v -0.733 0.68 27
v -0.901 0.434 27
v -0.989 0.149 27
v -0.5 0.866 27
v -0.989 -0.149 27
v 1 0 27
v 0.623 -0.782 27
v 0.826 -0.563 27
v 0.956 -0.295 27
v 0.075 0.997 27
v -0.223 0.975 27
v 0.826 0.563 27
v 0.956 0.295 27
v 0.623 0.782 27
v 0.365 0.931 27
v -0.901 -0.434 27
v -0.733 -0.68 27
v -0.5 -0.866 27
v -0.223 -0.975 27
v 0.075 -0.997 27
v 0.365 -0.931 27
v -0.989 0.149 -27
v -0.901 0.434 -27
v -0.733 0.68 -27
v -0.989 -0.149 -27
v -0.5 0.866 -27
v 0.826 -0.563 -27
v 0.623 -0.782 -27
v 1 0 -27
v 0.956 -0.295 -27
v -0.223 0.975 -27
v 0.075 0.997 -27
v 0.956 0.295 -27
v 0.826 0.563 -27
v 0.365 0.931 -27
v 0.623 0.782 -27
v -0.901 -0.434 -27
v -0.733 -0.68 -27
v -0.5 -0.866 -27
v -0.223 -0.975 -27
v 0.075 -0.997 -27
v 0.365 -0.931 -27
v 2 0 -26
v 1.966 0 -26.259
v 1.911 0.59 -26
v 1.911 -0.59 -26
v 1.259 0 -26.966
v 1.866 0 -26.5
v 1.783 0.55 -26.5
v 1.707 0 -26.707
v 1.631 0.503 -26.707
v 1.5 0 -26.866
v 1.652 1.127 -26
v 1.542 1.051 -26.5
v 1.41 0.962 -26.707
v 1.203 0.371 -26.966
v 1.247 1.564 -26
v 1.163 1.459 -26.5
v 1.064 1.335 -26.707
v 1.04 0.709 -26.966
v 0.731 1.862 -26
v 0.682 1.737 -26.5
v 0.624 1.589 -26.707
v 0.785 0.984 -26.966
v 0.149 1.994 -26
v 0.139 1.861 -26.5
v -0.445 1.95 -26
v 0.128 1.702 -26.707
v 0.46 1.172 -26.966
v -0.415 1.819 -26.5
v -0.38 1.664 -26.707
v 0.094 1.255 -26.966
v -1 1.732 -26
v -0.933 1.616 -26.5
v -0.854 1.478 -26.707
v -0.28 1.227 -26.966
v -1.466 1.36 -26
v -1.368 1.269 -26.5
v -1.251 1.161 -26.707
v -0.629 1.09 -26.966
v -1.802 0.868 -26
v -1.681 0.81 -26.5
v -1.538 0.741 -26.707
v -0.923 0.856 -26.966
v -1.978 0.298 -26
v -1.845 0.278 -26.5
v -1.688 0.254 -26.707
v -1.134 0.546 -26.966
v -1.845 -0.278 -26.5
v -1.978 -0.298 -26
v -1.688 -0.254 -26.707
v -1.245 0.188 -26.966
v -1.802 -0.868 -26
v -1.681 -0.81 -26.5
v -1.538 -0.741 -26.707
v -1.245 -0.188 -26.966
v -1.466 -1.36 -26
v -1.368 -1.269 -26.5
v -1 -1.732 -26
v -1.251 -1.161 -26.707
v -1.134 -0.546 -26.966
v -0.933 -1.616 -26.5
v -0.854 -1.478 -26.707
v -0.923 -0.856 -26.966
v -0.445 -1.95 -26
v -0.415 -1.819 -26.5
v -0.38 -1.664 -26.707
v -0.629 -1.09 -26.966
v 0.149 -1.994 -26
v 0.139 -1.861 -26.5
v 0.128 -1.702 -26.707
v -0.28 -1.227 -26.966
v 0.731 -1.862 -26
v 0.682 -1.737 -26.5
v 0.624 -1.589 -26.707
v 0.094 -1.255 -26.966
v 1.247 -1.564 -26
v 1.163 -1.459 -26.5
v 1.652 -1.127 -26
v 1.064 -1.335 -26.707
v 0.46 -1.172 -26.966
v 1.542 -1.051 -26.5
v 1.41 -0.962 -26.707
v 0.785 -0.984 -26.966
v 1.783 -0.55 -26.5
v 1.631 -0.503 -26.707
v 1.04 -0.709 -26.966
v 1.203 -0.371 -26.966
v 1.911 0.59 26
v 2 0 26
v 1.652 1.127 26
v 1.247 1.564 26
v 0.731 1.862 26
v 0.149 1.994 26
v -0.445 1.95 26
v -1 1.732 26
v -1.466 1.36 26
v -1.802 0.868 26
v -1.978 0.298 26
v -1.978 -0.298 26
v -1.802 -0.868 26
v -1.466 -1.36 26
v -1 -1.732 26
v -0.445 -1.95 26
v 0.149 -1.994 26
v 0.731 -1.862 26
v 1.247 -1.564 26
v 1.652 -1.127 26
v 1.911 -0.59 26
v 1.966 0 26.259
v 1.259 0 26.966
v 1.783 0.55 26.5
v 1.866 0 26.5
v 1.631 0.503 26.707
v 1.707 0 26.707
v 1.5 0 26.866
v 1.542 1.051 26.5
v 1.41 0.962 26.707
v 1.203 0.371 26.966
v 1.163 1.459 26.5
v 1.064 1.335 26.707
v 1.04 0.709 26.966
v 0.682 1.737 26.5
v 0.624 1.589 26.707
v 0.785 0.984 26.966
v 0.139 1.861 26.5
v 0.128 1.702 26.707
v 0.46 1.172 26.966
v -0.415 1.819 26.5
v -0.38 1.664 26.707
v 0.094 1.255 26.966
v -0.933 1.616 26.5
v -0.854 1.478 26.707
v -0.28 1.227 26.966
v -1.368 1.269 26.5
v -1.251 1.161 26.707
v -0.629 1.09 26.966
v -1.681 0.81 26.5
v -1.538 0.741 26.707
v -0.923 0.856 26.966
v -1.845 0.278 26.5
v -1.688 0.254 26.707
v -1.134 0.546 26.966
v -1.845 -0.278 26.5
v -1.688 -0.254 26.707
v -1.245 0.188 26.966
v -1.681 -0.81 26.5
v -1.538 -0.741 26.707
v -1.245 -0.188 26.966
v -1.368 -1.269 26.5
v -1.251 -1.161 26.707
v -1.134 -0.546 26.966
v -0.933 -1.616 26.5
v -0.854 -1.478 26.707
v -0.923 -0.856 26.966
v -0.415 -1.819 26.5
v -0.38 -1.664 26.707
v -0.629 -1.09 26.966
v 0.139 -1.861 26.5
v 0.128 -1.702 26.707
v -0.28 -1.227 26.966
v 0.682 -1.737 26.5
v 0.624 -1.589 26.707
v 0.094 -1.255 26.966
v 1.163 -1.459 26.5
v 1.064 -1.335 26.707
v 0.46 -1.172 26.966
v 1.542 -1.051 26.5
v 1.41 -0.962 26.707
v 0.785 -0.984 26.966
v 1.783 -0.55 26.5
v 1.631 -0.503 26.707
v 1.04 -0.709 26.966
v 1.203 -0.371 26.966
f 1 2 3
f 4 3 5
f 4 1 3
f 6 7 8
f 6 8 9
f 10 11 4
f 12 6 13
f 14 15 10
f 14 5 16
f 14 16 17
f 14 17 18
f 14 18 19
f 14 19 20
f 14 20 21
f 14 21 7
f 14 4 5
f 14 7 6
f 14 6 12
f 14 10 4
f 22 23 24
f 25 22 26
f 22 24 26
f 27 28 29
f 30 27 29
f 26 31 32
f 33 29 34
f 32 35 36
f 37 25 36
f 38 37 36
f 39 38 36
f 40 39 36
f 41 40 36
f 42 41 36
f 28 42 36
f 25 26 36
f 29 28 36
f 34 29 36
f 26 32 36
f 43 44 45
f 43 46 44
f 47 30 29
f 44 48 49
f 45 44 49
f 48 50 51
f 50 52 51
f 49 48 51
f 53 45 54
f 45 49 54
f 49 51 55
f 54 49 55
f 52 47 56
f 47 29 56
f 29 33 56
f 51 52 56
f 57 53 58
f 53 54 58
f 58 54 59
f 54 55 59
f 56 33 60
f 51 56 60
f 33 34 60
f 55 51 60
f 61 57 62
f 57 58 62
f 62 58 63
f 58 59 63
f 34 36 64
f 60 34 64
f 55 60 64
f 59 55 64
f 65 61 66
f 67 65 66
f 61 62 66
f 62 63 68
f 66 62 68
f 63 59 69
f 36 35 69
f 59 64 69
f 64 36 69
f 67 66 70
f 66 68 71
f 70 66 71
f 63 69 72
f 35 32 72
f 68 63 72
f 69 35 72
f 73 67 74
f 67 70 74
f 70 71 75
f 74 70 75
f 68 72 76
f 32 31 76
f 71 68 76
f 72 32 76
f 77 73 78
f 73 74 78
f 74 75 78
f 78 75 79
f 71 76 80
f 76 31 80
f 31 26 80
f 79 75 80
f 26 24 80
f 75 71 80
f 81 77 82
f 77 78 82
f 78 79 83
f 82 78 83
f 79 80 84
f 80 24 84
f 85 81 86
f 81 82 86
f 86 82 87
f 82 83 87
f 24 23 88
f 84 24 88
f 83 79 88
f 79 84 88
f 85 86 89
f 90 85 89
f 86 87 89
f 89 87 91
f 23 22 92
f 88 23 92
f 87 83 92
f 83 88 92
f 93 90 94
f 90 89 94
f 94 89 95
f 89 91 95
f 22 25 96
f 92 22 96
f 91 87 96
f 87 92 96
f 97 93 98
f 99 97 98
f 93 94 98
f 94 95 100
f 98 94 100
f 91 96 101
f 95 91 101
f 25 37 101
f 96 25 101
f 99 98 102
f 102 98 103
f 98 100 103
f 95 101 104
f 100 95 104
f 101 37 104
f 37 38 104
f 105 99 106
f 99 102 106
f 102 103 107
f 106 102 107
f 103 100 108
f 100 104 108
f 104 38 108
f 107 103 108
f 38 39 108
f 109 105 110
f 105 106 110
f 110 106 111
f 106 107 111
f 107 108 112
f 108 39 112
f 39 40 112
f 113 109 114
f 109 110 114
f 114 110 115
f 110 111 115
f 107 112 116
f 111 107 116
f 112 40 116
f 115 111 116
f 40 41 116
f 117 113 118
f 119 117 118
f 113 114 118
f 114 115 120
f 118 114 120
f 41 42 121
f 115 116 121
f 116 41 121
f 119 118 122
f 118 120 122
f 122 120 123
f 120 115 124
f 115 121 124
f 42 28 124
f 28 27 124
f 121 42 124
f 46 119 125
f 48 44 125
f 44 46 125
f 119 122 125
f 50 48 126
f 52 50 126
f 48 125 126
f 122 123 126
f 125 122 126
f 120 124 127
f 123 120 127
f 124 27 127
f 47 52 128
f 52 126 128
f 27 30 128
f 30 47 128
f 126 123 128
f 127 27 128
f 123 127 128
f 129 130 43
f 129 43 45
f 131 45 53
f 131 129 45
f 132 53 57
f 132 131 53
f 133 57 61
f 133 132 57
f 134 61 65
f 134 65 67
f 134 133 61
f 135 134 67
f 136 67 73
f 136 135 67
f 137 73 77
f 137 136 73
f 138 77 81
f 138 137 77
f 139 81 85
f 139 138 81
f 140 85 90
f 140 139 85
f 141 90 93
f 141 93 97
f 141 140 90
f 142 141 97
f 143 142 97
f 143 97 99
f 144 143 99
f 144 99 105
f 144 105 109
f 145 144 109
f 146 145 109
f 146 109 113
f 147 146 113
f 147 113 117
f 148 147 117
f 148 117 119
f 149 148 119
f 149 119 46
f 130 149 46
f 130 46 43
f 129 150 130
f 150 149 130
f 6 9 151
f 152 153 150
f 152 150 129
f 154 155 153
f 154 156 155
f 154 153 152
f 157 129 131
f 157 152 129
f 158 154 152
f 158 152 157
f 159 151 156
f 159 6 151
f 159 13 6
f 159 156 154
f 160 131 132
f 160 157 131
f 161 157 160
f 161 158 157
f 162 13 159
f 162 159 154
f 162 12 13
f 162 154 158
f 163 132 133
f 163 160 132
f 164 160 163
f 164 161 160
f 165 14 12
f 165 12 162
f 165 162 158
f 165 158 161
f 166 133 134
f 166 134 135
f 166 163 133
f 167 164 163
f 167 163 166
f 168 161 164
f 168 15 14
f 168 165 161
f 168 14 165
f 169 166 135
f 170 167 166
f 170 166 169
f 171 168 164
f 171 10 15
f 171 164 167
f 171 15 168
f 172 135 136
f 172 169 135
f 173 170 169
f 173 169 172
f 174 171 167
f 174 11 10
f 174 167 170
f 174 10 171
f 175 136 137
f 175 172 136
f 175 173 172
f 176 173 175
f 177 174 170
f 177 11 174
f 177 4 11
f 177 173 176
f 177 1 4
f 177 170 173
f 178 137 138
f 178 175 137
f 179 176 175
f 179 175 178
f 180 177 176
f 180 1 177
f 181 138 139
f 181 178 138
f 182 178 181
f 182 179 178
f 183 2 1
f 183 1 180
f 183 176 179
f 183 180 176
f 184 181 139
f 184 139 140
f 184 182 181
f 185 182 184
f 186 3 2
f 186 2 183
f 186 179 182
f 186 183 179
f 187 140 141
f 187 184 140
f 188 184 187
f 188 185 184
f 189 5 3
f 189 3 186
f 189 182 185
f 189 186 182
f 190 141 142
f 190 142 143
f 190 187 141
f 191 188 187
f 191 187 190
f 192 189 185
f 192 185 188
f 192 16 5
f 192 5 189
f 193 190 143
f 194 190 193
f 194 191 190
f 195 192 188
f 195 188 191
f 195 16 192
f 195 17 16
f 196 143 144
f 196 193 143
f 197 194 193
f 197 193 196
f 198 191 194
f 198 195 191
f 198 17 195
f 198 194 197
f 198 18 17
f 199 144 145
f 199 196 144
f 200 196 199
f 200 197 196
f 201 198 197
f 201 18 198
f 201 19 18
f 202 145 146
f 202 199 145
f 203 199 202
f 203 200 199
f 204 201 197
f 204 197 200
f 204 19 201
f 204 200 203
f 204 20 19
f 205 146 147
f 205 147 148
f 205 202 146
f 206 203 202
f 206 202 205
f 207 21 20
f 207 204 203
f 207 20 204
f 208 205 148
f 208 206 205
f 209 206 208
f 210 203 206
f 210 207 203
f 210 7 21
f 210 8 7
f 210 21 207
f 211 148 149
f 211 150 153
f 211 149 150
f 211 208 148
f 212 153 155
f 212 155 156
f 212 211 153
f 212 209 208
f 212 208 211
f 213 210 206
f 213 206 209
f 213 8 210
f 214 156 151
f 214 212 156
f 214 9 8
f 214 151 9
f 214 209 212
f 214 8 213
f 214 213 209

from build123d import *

# Parameters (mm, degrees)
SKETCH1_R           = 2
BOSS_EXTRUDE1_DEPTH = 27
FILLET1_R           = 1
FILLET2_R           = 1


with BuildPart() as part:
    # Sketch1 → Boss-Extrude1 (new body, symmetric)
    with BuildSketch(Plane.XY):
        Circle(SKETCH1_R)
    extrude(amount=BOSS_EXTRUDE1_DEPTH, both=True)

    # Fillet1
    fillet1_edges = [part.edges().sort_by_distance(p)[0] for p in [
        (-2, 0, 27),
    ]]
    fillet(fillet1_edges, radius=FILLET1_R)

    # Fillet2
    fillet2_edges = [part.edges().sort_by_distance(p)[0] for p in [
        (-2, 0, -27),
    ]]
    fillet(fillet2_edges, radius=FILLET2_R)


solid = part.part
